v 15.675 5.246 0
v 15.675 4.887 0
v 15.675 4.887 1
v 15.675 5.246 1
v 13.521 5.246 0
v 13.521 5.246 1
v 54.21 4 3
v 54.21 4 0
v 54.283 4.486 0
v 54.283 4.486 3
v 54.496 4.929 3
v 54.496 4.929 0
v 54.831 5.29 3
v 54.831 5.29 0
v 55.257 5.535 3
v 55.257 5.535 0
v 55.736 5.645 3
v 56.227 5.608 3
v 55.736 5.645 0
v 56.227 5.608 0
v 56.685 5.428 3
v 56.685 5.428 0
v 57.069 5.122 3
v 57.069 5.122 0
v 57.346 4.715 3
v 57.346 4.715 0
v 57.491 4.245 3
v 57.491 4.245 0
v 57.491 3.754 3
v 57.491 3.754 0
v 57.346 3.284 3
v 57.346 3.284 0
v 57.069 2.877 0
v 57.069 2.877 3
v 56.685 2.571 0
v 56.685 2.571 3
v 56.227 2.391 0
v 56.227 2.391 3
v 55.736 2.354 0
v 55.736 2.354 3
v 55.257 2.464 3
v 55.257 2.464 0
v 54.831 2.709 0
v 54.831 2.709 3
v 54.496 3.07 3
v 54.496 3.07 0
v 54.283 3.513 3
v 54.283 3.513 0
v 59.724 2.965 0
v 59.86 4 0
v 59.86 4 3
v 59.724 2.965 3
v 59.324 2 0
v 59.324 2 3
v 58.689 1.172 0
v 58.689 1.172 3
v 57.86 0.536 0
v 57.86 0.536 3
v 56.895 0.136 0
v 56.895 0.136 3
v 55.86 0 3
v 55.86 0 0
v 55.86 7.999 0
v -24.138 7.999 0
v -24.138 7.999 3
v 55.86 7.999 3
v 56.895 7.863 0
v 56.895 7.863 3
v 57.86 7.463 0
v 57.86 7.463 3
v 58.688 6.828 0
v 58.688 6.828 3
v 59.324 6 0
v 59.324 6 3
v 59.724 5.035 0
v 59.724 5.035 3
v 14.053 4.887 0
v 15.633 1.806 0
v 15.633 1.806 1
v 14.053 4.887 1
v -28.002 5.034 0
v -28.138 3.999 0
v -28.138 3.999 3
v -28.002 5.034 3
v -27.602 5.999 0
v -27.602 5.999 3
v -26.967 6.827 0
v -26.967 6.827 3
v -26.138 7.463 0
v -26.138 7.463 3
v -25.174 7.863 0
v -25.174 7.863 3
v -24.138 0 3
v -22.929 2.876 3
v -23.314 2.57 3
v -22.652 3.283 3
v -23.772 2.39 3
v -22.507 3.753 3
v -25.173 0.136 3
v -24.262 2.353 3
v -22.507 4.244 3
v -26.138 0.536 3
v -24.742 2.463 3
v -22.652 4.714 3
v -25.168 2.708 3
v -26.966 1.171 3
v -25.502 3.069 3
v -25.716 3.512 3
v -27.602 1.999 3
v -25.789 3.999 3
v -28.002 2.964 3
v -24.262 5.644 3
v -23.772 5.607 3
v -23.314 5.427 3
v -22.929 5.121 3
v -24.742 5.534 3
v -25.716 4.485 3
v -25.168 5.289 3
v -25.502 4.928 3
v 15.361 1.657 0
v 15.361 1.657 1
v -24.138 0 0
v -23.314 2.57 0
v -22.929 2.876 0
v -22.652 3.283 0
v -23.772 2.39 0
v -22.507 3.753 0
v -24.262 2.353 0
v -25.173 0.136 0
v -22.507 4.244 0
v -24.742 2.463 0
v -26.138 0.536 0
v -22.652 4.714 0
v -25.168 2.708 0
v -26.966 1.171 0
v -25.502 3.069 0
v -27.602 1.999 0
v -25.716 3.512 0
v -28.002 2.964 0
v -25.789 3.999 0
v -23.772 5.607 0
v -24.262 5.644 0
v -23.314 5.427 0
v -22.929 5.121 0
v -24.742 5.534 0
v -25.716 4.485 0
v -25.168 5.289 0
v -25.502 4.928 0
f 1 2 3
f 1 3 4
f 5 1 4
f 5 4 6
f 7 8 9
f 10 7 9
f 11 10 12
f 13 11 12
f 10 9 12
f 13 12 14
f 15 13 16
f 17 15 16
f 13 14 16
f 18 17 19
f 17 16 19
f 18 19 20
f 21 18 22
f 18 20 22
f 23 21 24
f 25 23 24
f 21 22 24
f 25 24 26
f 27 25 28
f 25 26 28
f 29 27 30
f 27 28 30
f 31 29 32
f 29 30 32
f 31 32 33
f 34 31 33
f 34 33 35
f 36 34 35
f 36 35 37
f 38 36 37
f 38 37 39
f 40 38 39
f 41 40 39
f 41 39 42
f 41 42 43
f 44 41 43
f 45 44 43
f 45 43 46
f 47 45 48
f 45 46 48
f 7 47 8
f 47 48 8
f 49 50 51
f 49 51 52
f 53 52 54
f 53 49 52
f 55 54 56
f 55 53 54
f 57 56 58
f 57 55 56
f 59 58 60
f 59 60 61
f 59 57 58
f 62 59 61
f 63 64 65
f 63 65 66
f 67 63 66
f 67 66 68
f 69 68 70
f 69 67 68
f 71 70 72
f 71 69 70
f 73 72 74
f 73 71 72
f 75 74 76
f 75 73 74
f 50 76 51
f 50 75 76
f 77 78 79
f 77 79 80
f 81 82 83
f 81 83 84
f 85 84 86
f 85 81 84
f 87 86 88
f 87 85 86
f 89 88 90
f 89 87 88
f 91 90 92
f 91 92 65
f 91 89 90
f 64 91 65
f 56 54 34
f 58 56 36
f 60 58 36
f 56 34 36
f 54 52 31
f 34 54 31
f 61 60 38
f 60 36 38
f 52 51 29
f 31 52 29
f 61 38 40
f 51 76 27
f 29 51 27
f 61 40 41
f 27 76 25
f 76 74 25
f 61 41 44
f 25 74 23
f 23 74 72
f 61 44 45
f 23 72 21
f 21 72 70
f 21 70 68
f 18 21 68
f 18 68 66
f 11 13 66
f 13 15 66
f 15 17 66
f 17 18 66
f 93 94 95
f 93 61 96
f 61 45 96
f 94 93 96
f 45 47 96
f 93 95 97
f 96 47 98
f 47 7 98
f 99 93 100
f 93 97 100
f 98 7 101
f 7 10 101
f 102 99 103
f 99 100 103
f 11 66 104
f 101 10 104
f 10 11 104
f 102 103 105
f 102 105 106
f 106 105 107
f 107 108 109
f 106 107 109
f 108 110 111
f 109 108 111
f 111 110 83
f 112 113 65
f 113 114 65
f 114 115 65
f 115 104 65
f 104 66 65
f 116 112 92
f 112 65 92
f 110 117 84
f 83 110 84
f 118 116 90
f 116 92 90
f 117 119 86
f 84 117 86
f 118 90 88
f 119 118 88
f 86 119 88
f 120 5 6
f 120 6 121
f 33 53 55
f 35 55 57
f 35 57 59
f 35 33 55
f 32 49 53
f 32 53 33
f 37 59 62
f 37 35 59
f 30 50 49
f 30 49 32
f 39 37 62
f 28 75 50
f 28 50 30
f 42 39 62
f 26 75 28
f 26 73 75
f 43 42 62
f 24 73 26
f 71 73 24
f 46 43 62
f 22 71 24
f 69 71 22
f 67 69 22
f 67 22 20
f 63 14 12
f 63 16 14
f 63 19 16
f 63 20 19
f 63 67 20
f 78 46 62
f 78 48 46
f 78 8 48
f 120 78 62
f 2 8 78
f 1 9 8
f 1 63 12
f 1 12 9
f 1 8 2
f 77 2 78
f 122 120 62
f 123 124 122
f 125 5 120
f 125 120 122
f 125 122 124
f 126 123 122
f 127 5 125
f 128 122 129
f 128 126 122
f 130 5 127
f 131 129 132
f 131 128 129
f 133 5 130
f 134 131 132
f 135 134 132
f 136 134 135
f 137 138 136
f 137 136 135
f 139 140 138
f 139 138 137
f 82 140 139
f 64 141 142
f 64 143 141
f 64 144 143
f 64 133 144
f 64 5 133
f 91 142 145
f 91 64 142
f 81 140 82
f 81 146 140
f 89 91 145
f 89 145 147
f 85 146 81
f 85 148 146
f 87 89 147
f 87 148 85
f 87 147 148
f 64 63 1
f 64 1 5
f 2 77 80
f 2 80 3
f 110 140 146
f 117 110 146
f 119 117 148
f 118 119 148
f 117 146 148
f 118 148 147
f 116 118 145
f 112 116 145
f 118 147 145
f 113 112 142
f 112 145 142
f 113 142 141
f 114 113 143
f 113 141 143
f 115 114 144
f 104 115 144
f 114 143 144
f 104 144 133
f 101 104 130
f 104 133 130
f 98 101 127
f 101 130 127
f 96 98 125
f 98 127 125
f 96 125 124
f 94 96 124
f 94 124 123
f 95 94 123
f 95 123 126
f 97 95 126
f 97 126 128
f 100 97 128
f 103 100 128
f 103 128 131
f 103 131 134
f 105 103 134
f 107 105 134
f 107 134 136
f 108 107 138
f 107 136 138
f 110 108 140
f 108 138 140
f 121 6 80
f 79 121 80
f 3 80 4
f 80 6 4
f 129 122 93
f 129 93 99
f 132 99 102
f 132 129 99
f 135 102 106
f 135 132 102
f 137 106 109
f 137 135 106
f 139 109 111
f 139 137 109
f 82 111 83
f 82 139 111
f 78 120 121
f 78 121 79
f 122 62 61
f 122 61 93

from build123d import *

# Parameters (mm, degrees)
SKETCH_1_R          = 1.65
EXTRUDE_1_DEPTH     = 3
CUT_EXTRUDE_1_DEPTH = 1


with BuildPart() as part:
    # 草图1 → 凸台-拉伸1 (new body)
    with BuildSketch(Plane(origin=(0, 0, 0), x_dir=(-1, 0, 0), z_dir=(0, 0, -1))):
        with BuildLine():
            Line((-55.860221974, 0), (24.13832066, 0))
            ThreePointArc((24.13832066, 0), (26.966394209, 1.171219344), (28.138320535, 3.999))
            ThreePointArc((28.138320535, 3.999), (26.96674766, 6.827427125), (24.138320535, 7.999))
            Line((24.138320535, 7.999), (-55.860222099, 7.999))
            ThreePointArc((-55.860222099, 7.999), (-58.688295648, 6.827780656), (-59.860221974, 4))
            ThreePointArc((-59.860221974, 4), (-58.688649099, 1.171572875), (-55.860221974, 0))
        make_face()
        with Locations((24.138809001, 3.998511534)):
            Circle(SKETCH_1_R, mode=Mode.SUBTRACT)
        with Locations((-55.859733508, 3.999511534)):
            Circle(SKETCH_1_R, mode=Mode.SUBTRACT)
    extrude(amount=-EXTRUDE_1_DEPTH)

    # 草图2 → 切除-拉伸1 (cut)
    with BuildSketch(Plane(origin=(0, 0, 0), x_dir=(-1, 0, 0), z_dir=(0, 0, -1))):
        Polygon((-15.675290893, 5.246411073), (-13.52144474, 5.246411073), (-15.361188329, 1.656667483), (-15.632522464, 1.806006425), (-14.05289506, 4.887436714), (-15.675290893, 4.887436714), align=None)
    extrude(amount=-CUT_EXTRUDE_1_DEPTH, mode=Mode.SUBTRACT)


solid = part.part
